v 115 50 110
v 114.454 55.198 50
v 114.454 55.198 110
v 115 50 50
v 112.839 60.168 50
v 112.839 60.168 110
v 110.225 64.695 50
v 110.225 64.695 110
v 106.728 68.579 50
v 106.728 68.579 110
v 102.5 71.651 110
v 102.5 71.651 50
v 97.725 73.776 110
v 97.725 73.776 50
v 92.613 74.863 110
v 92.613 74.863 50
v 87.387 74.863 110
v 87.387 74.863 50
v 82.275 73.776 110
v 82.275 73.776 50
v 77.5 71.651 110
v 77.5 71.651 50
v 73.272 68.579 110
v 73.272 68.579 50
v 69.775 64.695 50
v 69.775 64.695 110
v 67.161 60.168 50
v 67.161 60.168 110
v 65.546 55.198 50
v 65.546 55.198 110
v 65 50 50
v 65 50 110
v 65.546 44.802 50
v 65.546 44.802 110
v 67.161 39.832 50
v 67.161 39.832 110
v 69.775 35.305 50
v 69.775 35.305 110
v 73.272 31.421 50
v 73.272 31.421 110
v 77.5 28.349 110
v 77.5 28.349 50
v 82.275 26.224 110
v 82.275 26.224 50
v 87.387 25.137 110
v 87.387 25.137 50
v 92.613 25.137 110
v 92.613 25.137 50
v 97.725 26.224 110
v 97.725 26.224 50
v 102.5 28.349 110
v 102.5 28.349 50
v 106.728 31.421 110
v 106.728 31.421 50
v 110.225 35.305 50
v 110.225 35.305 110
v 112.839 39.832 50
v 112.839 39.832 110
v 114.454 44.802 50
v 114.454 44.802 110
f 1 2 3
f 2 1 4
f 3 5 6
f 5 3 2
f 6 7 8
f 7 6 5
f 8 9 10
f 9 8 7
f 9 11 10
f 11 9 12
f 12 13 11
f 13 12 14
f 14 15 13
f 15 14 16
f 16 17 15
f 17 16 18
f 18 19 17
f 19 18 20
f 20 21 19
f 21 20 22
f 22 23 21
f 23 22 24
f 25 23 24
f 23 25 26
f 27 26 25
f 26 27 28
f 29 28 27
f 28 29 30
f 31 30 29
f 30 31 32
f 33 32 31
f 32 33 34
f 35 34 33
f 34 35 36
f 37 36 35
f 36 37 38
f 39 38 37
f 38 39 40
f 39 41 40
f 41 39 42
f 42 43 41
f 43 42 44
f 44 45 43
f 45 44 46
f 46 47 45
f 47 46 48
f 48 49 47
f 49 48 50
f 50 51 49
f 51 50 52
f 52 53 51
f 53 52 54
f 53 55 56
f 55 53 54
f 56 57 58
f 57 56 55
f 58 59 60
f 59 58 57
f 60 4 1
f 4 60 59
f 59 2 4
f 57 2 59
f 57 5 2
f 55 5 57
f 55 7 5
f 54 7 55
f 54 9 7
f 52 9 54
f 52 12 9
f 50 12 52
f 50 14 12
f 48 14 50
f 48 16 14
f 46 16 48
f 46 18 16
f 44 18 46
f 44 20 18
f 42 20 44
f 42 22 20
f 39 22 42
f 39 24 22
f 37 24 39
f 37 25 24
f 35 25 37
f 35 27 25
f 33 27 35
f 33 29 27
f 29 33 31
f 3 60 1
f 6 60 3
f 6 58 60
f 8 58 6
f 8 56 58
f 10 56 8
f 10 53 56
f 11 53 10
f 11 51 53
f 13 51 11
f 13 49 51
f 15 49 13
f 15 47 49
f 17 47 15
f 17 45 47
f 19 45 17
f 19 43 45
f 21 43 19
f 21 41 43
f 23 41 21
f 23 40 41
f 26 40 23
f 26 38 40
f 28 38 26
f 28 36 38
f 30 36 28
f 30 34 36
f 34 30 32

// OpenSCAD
y=100;
x=50;
z=(y-x);
difference()
{

minkowski()
{
cube([180,y,100]);
sphere(10);
}

echo (z);
!translate([90, y/2, z]) cylinder(x+10,r=25);

}
